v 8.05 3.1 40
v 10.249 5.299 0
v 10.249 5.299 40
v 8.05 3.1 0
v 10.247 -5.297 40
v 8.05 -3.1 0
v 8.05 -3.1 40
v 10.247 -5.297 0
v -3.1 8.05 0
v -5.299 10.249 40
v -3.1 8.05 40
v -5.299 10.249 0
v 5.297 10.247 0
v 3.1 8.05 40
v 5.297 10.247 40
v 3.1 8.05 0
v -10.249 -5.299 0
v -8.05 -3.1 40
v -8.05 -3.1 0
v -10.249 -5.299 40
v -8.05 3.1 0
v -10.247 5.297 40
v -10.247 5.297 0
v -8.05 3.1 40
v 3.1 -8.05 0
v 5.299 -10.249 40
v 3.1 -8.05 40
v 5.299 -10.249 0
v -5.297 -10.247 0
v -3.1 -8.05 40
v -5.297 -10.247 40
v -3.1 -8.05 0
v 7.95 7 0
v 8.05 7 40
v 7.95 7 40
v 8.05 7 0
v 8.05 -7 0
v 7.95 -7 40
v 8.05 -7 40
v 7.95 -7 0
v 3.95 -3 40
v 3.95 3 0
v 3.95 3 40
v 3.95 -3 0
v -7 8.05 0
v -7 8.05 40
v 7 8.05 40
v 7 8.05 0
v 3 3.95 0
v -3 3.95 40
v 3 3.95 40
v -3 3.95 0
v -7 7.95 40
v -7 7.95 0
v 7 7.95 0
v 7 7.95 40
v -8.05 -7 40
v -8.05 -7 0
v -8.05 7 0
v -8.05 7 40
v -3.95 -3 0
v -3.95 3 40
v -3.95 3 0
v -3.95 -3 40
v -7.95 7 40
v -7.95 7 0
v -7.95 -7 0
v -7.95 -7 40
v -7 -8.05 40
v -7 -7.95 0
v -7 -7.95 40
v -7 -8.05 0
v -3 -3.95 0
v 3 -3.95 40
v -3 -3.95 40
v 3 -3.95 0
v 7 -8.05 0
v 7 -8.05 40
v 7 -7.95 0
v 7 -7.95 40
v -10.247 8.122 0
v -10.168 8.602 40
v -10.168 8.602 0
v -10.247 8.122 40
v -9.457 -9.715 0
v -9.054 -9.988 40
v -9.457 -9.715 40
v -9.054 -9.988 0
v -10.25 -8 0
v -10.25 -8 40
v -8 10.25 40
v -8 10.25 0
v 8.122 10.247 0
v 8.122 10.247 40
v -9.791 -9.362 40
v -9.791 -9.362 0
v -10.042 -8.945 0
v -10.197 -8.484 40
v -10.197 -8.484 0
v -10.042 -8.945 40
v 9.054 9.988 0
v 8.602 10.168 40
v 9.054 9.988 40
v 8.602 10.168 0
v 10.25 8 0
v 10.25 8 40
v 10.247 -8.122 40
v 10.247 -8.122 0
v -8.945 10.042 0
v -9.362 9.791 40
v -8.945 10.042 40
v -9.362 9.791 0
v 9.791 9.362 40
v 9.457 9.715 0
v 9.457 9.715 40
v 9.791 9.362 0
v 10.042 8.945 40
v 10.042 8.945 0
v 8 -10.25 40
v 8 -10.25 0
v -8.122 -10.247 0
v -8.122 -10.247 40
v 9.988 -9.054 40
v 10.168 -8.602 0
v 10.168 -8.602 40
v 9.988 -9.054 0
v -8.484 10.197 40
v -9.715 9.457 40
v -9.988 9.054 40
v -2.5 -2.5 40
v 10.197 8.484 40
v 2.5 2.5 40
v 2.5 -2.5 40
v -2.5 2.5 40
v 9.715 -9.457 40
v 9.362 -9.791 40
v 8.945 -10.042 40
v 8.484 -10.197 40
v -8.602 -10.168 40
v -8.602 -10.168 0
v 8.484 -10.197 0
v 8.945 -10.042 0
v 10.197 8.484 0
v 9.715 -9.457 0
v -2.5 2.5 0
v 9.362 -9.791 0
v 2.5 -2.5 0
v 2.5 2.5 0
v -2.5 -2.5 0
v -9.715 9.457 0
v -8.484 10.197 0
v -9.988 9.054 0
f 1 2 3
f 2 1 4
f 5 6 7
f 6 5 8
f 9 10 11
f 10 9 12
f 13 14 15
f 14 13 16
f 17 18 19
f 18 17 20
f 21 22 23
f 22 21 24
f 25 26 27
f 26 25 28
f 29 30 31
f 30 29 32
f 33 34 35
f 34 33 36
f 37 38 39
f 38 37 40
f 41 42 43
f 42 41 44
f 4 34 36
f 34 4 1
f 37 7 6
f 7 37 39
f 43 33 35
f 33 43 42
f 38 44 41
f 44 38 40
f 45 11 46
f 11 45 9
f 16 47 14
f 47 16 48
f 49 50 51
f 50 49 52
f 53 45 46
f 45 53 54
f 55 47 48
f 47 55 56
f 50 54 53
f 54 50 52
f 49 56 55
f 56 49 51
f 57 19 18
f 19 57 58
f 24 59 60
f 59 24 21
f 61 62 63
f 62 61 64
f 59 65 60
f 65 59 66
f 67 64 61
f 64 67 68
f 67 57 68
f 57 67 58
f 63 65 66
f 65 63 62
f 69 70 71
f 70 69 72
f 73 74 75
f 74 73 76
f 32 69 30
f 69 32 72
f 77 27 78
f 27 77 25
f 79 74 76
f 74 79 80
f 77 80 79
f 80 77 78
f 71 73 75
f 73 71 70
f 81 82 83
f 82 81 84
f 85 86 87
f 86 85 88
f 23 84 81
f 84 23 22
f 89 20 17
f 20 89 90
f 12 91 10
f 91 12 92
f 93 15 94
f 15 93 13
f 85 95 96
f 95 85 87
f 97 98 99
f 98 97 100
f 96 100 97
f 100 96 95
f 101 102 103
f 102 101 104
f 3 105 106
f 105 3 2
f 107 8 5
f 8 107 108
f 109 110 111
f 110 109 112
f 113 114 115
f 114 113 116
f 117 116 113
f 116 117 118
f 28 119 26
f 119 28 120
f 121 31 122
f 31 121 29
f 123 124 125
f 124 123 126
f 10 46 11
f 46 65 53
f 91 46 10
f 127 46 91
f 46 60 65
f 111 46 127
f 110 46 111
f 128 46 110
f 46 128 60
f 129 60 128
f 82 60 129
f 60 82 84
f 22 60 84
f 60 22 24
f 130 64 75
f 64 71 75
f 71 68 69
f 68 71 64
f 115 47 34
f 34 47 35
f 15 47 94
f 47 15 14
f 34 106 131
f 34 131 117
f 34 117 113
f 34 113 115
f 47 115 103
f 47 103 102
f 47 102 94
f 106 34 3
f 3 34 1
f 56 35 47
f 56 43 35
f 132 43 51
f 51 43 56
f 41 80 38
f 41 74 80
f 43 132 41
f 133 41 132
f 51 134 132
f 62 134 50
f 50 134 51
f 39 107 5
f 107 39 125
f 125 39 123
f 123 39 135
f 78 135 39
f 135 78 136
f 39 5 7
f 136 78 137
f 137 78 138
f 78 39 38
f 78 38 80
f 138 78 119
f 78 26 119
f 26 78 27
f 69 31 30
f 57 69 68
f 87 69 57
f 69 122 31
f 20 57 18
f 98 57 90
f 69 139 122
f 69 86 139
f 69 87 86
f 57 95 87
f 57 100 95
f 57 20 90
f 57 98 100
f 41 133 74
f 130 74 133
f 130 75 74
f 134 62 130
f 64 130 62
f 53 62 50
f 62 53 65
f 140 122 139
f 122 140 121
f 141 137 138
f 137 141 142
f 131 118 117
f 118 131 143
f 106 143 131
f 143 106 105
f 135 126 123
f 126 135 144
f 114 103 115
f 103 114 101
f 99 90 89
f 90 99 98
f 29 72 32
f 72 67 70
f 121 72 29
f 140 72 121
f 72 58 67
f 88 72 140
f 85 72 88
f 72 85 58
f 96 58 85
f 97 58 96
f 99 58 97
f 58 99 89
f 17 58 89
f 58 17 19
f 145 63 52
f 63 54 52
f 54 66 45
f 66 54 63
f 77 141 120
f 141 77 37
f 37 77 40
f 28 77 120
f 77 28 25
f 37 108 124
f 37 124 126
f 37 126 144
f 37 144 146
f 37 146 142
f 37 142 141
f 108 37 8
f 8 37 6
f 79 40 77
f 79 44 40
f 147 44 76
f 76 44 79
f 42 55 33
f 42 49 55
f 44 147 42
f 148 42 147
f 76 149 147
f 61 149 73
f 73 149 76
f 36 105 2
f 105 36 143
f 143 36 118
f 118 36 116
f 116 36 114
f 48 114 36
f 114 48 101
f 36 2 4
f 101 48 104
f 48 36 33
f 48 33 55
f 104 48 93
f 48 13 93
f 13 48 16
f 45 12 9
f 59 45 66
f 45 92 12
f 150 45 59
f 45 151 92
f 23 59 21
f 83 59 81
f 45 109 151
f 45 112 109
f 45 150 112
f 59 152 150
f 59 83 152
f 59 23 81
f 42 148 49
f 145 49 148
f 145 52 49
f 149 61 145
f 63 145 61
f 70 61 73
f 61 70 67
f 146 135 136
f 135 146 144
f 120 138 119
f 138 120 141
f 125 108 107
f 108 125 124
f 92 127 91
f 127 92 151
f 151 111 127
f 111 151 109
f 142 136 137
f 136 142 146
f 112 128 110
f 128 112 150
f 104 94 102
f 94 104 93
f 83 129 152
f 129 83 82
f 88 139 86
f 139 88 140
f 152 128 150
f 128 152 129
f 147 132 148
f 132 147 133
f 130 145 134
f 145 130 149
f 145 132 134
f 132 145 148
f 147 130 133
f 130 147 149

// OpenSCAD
// file: configuration.scad
mdf_wall = 6.5;
mdf_tab = 15;

wall = 5;

screw_slop = .2;
slop = .2;
laser_slop = .1;

//these can't change - measured values.
beam = 20;
bed_screw_sep = 309;
bed = 300;

layer_height=.2;

idler_rad = 17.5/2;
idler_flange_rad = 22/2;

pulley_rad = 13/2;
pulley_flange_rad = 18/2;

wheel_rad = 10.2;
wheel_clearance = 26;
wheel_height = 10.4;
wheel_flange_rad = 24.5/2;

eccentric_rad = 7.3/2;
eccentric_flange_rad = 11/2;

motor_w = 42;
motor_r = 52/2;

belt_thick = 6;
belt_width = 2;


//frame lengths - may be dependent on wall above.
frame_x = 500;  //we lose more in X because of the endcaps - it's where all the motors etc. will hide.
frame_y = 450;  //(450-300)/2-wall-beam=50mm on either side of the printer.
frame_z = 450;  //because square is nice.

echo("BOM: 4, reg rail, 2020", frame_x, "Frame");

//gantry - might want to make it bigger
echo("BOM: 1, v-rail, 2020", frame_y, "Gantry");

//bed lengths
bed_x = 300+beam*2;
bed_y = 300;  //the screwholes on the bed should line up with the long_bed rails.
echo("BOM: 2, reg rail, 2020", bed_x, "Bed mount");
echo("BOM: 3, reg rail, 2020", bed_y, "Bed mount");  //might want more than three - to hold insulation well.

//standard screw variables
m3_nut_rad = 6.01/2+slop;
m3_nut_height = 2.4;
m3_rad = 3/2+slop;
m3_cap_rad = 3.25;
m3_cap_height = 2;

m4_nut_rad = 7.66/2+slop;
m4_nut_height = 3.2;
m4_rad = 4/2+slop;
m4_cap_rad = 7/2+slop;
m4_cap_height = 2.5;

m5_nut_rad = 8.79/2+slop;
m5_nut_height = 4.7;
m5_rad = 5/2+slop;
m5_cap_rad = 10/2+slop;
m5_cap_height = 3;


//some enums
MALE = 1;
FEMALE = -1;

//makes all the holes have lots of segments
$fs=.5;
$fa=.1;
// main file
include <configuration.scad>

beam(40, true, .25);

slot_w = 6;
slot_d = 6;
slot_inner_w = 14;
slot_inner_h = 4;

module beam_2040(height=20, v=false, slop=0){
    translate([-beam/2,0,0]) beam(height=height, v=v, slop=slop);
    translate([beam/2,0,0]) beam(height=height, v=v, slop=slop);
}

module beam(height=20, v=false, slop=0){
	rad = 2;
	

	center_w = 5;

	difference(){
		hull(){
			for(i=[0:90:359])
				rotate([0,0,i])
					translate([beam/2-rad, beam/2-rad, 0]) cylinder(r=rad+slop, h=height);
		}

		//slots
		beamSlots(height=height, v=v, slop=0);

		//center hole
		cube([center_w, center_w, height*3],center=true);
	}
}

module beamSlots(height=20, v=false, slop=0){
    for(i=[0:90:359]) rotate([0,0,i]){
        translate([beam/2,0,0]) cube([slot_d*2-slop*2,slot_w-slop*2,height*3],center=true);
        //v rail
        if(v==true){
            hull(){
                translate([beam/2-slot_d+slot_inner_h+slop,0,0]) cube([.1,slot_w-slop*2,height*3],center=true);
                translate([beam/2-slot_d+slot_inner_h+10-slop,0,0]) cube([.1,slot_w+20-slop*2,height*3],center=true);
            }
        }
    }
    nutSlots(height=height, slop=slop);
}

module nutSlots(height=20, slop=0){
    //angled inner
    for(i=[0:90:359]) rotate([0,0,i]){
			hull(){
				translate([beam/2-slot_d+slop,0,0]) cube([.1,slot_w-slop*2,height*3],center=true);
				translate([beam/2-slot_d+slot_inner_h-slop,0,0]) cube([.1,slot_inner_w-slop*4,height*3],center=true);
			}
        }
}

module endScrew(height=20){
    cylinder(r=m5_rad, h=height*3, center=true);
}

module beamHoles(height=20, slop=.25){
    nutSlots(height=height, slop=slop);
    endScrew(height=height);
}
